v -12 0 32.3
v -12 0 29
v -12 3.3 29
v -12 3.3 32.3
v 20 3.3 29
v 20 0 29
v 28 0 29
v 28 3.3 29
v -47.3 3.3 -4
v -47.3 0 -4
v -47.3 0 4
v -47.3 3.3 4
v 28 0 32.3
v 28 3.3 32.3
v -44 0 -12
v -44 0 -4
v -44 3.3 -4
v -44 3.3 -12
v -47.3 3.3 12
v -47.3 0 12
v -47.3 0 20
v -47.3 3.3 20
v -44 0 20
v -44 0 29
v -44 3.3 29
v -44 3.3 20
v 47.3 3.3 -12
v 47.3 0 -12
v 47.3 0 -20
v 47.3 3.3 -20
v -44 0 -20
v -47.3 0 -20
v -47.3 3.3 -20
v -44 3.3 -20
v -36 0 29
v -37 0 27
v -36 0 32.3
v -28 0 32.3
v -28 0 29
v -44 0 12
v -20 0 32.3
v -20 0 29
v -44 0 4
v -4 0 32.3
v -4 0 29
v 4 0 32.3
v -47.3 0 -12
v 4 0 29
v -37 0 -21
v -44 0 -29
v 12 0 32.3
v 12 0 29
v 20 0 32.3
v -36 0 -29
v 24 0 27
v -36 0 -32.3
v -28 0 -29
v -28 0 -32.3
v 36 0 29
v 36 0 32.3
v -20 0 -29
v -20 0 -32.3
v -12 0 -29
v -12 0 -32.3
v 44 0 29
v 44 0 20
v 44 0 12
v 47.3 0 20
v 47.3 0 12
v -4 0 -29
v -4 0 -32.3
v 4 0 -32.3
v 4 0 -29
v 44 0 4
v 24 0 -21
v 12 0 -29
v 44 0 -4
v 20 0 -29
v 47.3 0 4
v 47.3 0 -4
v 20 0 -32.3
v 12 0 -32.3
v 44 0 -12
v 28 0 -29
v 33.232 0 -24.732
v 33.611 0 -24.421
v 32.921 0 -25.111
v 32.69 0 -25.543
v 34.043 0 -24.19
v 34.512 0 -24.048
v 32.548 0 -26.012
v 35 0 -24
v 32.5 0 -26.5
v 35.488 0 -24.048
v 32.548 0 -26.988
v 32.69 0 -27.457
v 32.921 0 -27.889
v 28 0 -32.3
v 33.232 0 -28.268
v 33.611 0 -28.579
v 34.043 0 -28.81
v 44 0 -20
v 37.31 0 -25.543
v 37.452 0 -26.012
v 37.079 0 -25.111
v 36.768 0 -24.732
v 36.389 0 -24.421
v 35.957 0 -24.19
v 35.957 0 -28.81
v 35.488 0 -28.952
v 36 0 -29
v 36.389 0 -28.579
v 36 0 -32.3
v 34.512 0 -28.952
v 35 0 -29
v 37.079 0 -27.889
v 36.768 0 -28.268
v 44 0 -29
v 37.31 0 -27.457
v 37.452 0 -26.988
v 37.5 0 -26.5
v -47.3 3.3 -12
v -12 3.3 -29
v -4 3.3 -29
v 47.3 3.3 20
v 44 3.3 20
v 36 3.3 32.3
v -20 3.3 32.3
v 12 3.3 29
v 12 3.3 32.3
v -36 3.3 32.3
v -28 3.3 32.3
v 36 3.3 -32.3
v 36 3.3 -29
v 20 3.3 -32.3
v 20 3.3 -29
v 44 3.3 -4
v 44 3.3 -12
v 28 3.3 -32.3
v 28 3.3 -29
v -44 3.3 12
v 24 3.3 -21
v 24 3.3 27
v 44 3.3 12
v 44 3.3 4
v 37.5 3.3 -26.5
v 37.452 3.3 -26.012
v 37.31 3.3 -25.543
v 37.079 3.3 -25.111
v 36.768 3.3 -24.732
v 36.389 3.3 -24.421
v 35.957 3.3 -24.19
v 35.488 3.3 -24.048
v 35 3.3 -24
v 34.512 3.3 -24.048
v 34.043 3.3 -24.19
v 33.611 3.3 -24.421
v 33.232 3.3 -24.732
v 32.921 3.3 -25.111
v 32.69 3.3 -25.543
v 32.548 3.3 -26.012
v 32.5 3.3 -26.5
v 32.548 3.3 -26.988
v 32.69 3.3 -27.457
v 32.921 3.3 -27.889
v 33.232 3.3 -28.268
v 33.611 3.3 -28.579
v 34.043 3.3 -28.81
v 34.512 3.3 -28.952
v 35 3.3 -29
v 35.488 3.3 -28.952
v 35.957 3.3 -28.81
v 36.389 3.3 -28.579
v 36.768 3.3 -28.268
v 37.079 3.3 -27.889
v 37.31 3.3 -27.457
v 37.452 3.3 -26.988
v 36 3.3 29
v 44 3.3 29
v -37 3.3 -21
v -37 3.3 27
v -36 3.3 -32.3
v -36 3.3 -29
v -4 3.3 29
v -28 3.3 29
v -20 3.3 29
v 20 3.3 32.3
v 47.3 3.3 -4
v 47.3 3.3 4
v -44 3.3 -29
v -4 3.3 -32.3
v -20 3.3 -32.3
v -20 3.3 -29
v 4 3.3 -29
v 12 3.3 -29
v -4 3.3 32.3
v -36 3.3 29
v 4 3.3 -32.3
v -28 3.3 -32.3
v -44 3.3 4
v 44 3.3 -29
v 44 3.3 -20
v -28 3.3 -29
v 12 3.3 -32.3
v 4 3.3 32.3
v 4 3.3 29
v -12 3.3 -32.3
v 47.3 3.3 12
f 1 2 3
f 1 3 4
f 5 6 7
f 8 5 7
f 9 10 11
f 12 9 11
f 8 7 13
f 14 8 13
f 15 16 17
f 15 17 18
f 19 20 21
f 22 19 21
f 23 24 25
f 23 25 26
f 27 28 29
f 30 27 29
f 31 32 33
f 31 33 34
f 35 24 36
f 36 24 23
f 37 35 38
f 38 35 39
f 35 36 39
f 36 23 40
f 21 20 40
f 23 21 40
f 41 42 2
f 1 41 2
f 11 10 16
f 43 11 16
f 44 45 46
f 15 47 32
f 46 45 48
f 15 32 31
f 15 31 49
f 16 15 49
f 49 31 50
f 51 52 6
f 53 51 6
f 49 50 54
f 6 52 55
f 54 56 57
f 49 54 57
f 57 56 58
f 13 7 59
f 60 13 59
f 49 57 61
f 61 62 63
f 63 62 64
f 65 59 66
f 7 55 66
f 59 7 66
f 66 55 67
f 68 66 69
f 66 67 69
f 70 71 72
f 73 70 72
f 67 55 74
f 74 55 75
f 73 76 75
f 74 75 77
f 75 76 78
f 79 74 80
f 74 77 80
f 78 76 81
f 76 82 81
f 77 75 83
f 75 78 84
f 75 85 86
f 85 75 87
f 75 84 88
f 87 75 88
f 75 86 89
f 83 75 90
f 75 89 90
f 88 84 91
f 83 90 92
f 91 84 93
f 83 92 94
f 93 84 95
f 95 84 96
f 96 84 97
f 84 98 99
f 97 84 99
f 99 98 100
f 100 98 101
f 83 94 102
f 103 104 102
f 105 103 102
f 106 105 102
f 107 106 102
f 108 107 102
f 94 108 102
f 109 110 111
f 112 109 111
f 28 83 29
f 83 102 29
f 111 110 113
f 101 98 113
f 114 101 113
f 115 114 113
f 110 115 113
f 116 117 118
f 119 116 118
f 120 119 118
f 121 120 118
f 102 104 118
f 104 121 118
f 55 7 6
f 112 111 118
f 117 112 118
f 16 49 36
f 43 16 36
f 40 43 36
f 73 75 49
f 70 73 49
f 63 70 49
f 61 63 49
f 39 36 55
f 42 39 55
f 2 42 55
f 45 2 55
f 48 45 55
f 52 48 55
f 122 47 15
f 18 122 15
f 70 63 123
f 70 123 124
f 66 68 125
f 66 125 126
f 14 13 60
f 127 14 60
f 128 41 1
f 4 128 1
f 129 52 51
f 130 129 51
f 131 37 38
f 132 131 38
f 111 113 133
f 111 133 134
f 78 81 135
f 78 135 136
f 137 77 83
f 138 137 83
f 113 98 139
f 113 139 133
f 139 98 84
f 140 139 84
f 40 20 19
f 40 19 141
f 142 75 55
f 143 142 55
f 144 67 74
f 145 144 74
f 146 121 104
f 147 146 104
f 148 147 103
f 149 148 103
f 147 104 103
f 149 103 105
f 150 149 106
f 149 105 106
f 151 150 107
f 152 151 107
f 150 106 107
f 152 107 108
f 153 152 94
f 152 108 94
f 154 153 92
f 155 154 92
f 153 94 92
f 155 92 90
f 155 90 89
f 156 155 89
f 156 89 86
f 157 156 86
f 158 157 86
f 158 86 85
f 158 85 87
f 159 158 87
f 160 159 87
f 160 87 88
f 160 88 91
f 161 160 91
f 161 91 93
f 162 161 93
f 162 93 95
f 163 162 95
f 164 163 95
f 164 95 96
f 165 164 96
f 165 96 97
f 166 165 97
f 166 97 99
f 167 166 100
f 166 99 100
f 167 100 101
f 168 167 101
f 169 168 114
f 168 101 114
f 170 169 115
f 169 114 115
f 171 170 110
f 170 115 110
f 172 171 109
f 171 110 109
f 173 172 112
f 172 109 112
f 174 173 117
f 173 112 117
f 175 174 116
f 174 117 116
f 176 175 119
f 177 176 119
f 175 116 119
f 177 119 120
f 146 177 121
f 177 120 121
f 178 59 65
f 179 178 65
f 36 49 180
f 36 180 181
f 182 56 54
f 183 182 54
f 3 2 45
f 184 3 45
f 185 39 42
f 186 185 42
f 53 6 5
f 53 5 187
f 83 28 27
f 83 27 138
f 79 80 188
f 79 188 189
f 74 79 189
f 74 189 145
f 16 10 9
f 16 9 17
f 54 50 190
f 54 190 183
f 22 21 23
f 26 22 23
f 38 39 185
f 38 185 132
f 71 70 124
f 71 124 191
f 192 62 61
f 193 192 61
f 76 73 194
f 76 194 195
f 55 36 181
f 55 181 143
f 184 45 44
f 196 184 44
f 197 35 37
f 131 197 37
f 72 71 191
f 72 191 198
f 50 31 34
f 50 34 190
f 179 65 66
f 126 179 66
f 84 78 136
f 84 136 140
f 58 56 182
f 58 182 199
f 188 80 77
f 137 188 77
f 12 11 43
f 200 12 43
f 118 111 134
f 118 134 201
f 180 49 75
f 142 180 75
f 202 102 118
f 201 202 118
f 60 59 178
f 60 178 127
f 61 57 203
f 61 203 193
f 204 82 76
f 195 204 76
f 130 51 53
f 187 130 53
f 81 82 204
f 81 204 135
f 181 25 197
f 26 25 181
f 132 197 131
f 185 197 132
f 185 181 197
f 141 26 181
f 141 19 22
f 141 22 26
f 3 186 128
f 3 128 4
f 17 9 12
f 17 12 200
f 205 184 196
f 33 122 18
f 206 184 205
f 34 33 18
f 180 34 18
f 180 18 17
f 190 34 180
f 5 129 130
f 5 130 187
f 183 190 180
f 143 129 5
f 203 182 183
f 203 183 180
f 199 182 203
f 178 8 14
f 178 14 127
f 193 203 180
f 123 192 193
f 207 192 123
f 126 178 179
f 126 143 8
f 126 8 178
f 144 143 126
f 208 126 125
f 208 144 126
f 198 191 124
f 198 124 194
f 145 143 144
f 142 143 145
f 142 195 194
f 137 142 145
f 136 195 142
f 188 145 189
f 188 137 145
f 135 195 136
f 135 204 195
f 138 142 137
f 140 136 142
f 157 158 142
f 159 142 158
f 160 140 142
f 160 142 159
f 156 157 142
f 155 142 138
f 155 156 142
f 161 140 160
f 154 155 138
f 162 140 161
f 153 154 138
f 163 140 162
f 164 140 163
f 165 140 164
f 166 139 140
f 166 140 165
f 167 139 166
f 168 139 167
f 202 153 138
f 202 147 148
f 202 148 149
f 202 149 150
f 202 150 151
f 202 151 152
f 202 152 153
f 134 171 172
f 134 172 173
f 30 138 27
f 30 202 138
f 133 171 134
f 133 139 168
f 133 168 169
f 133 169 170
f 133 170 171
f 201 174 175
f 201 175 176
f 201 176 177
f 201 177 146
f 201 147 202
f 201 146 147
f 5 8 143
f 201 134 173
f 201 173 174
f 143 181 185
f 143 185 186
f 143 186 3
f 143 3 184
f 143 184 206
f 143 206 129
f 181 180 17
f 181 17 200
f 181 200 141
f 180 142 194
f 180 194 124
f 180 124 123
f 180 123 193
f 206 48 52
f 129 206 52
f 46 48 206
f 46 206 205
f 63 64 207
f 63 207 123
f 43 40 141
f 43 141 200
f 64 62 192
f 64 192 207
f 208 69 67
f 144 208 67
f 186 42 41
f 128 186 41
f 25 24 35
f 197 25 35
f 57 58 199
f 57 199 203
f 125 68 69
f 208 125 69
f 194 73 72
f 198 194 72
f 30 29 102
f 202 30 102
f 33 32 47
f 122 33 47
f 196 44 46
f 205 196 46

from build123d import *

# Parameters (mm, degrees)
ESQUISSE4_W                    = 88
ESQUISSE4_H                    = 58
BOSS_EXTRU_3_DEPTH             = 3.3
ESQUISSE5_W                    = 8
ESQUISSE5_H                    = 3.3
BOSS_EXTRU_6_DEPTH             = 3.3
R_P_TITION_LIN_AIRE2_COUNT     = 3
R_P_TITION_LIN_AIRE2_PITCH     = 16
R_P_TITION_LIN_AIRE2_COL_COUNT = 3
R_P_TITION_LIN_AIRE2_COL_PITCH = 16
SYM_TRIE1_COPY_1_SKETCH_W      = 8
SYM_TRIE1_COPY_1_SKETCH_H      = 3.3
SYM_TRIE1_COPY_1_DEPTH         = 3.3
SYM_TRIE1_COPY_2_SKETCH_W      = 8
SYM_TRIE1_COPY_2_SKETCH_H      = 3.3
SYM_TRIE1_COPY_2_DEPTH         = 3.3
SYM_TRIE1_COPY_3_SKETCH_W      = 8
SYM_TRIE1_COPY_3_SKETCH_H      = 3.3
SYM_TRIE1_COPY_3_DEPTH         = 3.3
SYM_TRIE1_COPY_4_SKETCH_W      = 8
SYM_TRIE1_COPY_4_SKETCH_H      = 3.3
SYM_TRIE1_COPY_4_DEPTH         = 3.3
ESQUISSE6_W                    = 3.3
ESQUISSE6_H                    = 8
BOSS_EXTRU_7_DEPTH             = 3.3
R_P_TITION_LIN_AIRE3_COUNT     = 2
R_P_TITION_LIN_AIRE3_PITCH     = 16
R_P_TITION_LIN_AIRE3_COL_COUNT = 2
R_P_TITION_LIN_AIRE3_COL_PITCH = 16
SYM_TRIE2_COPY_1_SKETCH_W      = 3.3
SYM_TRIE2_COPY_1_SKETCH_H      = 8
SYM_TRIE2_COPY_1_DEPTH         = 3.3
SYM_TRIE2_COPY_2_SKETCH_W      = 3.3
SYM_TRIE2_COPY_2_SKETCH_H      = 8
SYM_TRIE2_COPY_2_DEPTH         = 3.3
ESQUISSE7_R                    = 2.5
ESQUISSE7_W                    = 61
ESQUISSE7_H                    = 48
ENL_V_MAT_EXTRU_1_DEPTH        = 1
ENL_V_MAT_EXTRU_1_DEPTH_BACK   = 4.3


with BuildPart() as part:
    # Esquisse4 → Boss.-Extru.3 (new body)
    with BuildSketch(Plane(origin=(0, 0, 0), x_dir=(1, 0, 0), z_dir=(0, 1, 0))):
        Rectangle(ESQUISSE4_W, ESQUISSE4_H)
    extrude(amount=BOSS_EXTRU_3_DEPTH)

    # Esquisse5 → Boss.-Extru.6 (add)
    with BuildSketch(Plane.XZ):
        with Locations((0, 30.65)):
            Rectangle(ESQUISSE5_W, ESQUISSE5_H)
    boss_extru_6 = extrude(amount=-BOSS_EXTRU_6_DEPTH)

    # Répétition linéaire2: Boss.-Extru.6 ×3
    with Locations(*[(-i * R_P_TITION_LIN_AIRE2_PITCH, 0, 0) for i in range(1, R_P_TITION_LIN_AIRE2_COUNT)]):
        add(boss_extru_6)

    # Répétition linéaire2 col: Boss.-Extru.6 ×3
    with Locations(*[(i * R_P_TITION_LIN_AIRE2_COL_PITCH, 0, 0) for i in range(1, R_P_TITION_LIN_AIRE2_COL_COUNT)]):
        add(boss_extru_6)

    # Symétrie1: Boss.-Extru.6 across plane
    add(boss_extru_6.mirror(Plane.XY))

    # Symétrie1 copy 1 sketch → Symétrie1 copy 1 (add)
    with BuildSketch(Plane(origin=(-16, 0, 0), x_dir=(1, 0, 0), z_dir=(0, -1, 0))):
        with Locations((0, -30.65)):
            Rectangle(SYM_TRIE1_COPY_1_SKETCH_W, SYM_TRIE1_COPY_1_SKETCH_H)
    extrude(amount=-SYM_TRIE1_COPY_1_DEPTH)

    # Symétrie1 copy 2 sketch → Symétrie1 copy 2 (add)
    with BuildSketch(Plane(origin=(-32, 0, 0), x_dir=(1, 0, 0), z_dir=(0, -1, 0))):
        with Locations((0, -30.65)):
            Rectangle(SYM_TRIE1_COPY_2_SKETCH_W, SYM_TRIE1_COPY_2_SKETCH_H)
    extrude(amount=-SYM_TRIE1_COPY_2_DEPTH)

    # Symétrie1 copy 3 sketch → Symétrie1 copy 3 (add)
    with BuildSketch(Plane(origin=(16, 0, 0), x_dir=(1, 0, 0), z_dir=(0, -1, 0))):
        with Locations((0, -30.65)):
            Rectangle(SYM_TRIE1_COPY_3_SKETCH_W, SYM_TRIE1_COPY_3_SKETCH_H)
    extrude(amount=-SYM_TRIE1_COPY_3_DEPTH)

    # Symétrie1 copy 4 sketch → Symétrie1 copy 4 (add)
    with BuildSketch(Plane(origin=(32, 0, 0), x_dir=(1, 0, 0), z_dir=(0, -1, 0))):
        with Locations((0, -30.65)):
            Rectangle(SYM_TRIE1_COPY_4_SKETCH_W, SYM_TRIE1_COPY_4_SKETCH_H)
    extrude(amount=-SYM_TRIE1_COPY_4_DEPTH)

    # Esquisse6 → Boss.-Extru.7 (add)
    with BuildSketch(Plane.XZ):
        with Locations((-45.65, 0)):
            Rectangle(ESQUISSE6_W, ESQUISSE6_H)
    boss_extru_7 = extrude(amount=-BOSS_EXTRU_7_DEPTH)

    # Répétition linéaire3: Boss.-Extru.7 ×2
    with Locations(*[(0, 0, i * R_P_TITION_LIN_AIRE3_PITCH) for i in range(1, R_P_TITION_LIN_AIRE3_COUNT)]):
        add(boss_extru_7)

    # Répétition linéaire3 col: Boss.-Extru.7 ×2
    with Locations(*[(0, 0, -i * R_P_TITION_LIN_AIRE3_COL_PITCH) for i in range(1, R_P_TITION_LIN_AIRE3_COL_COUNT)]):
        add(boss_extru_7)

    # Symétrie2: Boss.-Extru.7 across plane
    add(boss_extru_7.mirror(Plane(origin=(0, 0, 0), x_dir=(0, 0, 1), z_dir=(1, 0, 0))))

    # Symétrie2 copy 1 sketch → Symétrie2 copy 1 (add)
    with BuildSketch(Plane(origin=(0, 0, 16), x_dir=(-1, 0, 0), z_dir=(0, -1, 0))):
        with Locations((-45.65, 0)):
            Rectangle(SYM_TRIE2_COPY_1_SKETCH_W, SYM_TRIE2_COPY_1_SKETCH_H)
    extrude(amount=-SYM_TRIE2_COPY_1_DEPTH)

    # Symétrie2 copy 2 sketch → Symétrie2 copy 2 (add)
    with BuildSketch(Plane(origin=(0, 0, -16), x_dir=(-1, 0, 0), z_dir=(0, -1, 0))):
        with Locations((-45.65, 0)):
            Rectangle(SYM_TRIE2_COPY_2_SKETCH_W, SYM_TRIE2_COPY_2_SKETCH_H)
    extrude(amount=-SYM_TRIE2_COPY_2_DEPTH)

    # Esquisse7 → Enlèv. mat.-Extru.1 (cut, two sides)
    with BuildSketch(Plane.XZ) as enl_v_mat_extru_1_sk:
        with Locations((35, -26.5)):
            Circle(ESQUISSE7_R)
        with Locations((-6.5, 3)):
            Rectangle(ESQUISSE7_W, ESQUISSE7_H)
    extrude(amount=ENL_V_MAT_EXTRU_1_DEPTH, mode=Mode.SUBTRACT)
    extrude(enl_v_mat_extru_1_sk.sketch, amount=-ENL_V_MAT_EXTRU_1_DEPTH_BACK, mode=Mode.SUBTRACT)


solid = part.part
